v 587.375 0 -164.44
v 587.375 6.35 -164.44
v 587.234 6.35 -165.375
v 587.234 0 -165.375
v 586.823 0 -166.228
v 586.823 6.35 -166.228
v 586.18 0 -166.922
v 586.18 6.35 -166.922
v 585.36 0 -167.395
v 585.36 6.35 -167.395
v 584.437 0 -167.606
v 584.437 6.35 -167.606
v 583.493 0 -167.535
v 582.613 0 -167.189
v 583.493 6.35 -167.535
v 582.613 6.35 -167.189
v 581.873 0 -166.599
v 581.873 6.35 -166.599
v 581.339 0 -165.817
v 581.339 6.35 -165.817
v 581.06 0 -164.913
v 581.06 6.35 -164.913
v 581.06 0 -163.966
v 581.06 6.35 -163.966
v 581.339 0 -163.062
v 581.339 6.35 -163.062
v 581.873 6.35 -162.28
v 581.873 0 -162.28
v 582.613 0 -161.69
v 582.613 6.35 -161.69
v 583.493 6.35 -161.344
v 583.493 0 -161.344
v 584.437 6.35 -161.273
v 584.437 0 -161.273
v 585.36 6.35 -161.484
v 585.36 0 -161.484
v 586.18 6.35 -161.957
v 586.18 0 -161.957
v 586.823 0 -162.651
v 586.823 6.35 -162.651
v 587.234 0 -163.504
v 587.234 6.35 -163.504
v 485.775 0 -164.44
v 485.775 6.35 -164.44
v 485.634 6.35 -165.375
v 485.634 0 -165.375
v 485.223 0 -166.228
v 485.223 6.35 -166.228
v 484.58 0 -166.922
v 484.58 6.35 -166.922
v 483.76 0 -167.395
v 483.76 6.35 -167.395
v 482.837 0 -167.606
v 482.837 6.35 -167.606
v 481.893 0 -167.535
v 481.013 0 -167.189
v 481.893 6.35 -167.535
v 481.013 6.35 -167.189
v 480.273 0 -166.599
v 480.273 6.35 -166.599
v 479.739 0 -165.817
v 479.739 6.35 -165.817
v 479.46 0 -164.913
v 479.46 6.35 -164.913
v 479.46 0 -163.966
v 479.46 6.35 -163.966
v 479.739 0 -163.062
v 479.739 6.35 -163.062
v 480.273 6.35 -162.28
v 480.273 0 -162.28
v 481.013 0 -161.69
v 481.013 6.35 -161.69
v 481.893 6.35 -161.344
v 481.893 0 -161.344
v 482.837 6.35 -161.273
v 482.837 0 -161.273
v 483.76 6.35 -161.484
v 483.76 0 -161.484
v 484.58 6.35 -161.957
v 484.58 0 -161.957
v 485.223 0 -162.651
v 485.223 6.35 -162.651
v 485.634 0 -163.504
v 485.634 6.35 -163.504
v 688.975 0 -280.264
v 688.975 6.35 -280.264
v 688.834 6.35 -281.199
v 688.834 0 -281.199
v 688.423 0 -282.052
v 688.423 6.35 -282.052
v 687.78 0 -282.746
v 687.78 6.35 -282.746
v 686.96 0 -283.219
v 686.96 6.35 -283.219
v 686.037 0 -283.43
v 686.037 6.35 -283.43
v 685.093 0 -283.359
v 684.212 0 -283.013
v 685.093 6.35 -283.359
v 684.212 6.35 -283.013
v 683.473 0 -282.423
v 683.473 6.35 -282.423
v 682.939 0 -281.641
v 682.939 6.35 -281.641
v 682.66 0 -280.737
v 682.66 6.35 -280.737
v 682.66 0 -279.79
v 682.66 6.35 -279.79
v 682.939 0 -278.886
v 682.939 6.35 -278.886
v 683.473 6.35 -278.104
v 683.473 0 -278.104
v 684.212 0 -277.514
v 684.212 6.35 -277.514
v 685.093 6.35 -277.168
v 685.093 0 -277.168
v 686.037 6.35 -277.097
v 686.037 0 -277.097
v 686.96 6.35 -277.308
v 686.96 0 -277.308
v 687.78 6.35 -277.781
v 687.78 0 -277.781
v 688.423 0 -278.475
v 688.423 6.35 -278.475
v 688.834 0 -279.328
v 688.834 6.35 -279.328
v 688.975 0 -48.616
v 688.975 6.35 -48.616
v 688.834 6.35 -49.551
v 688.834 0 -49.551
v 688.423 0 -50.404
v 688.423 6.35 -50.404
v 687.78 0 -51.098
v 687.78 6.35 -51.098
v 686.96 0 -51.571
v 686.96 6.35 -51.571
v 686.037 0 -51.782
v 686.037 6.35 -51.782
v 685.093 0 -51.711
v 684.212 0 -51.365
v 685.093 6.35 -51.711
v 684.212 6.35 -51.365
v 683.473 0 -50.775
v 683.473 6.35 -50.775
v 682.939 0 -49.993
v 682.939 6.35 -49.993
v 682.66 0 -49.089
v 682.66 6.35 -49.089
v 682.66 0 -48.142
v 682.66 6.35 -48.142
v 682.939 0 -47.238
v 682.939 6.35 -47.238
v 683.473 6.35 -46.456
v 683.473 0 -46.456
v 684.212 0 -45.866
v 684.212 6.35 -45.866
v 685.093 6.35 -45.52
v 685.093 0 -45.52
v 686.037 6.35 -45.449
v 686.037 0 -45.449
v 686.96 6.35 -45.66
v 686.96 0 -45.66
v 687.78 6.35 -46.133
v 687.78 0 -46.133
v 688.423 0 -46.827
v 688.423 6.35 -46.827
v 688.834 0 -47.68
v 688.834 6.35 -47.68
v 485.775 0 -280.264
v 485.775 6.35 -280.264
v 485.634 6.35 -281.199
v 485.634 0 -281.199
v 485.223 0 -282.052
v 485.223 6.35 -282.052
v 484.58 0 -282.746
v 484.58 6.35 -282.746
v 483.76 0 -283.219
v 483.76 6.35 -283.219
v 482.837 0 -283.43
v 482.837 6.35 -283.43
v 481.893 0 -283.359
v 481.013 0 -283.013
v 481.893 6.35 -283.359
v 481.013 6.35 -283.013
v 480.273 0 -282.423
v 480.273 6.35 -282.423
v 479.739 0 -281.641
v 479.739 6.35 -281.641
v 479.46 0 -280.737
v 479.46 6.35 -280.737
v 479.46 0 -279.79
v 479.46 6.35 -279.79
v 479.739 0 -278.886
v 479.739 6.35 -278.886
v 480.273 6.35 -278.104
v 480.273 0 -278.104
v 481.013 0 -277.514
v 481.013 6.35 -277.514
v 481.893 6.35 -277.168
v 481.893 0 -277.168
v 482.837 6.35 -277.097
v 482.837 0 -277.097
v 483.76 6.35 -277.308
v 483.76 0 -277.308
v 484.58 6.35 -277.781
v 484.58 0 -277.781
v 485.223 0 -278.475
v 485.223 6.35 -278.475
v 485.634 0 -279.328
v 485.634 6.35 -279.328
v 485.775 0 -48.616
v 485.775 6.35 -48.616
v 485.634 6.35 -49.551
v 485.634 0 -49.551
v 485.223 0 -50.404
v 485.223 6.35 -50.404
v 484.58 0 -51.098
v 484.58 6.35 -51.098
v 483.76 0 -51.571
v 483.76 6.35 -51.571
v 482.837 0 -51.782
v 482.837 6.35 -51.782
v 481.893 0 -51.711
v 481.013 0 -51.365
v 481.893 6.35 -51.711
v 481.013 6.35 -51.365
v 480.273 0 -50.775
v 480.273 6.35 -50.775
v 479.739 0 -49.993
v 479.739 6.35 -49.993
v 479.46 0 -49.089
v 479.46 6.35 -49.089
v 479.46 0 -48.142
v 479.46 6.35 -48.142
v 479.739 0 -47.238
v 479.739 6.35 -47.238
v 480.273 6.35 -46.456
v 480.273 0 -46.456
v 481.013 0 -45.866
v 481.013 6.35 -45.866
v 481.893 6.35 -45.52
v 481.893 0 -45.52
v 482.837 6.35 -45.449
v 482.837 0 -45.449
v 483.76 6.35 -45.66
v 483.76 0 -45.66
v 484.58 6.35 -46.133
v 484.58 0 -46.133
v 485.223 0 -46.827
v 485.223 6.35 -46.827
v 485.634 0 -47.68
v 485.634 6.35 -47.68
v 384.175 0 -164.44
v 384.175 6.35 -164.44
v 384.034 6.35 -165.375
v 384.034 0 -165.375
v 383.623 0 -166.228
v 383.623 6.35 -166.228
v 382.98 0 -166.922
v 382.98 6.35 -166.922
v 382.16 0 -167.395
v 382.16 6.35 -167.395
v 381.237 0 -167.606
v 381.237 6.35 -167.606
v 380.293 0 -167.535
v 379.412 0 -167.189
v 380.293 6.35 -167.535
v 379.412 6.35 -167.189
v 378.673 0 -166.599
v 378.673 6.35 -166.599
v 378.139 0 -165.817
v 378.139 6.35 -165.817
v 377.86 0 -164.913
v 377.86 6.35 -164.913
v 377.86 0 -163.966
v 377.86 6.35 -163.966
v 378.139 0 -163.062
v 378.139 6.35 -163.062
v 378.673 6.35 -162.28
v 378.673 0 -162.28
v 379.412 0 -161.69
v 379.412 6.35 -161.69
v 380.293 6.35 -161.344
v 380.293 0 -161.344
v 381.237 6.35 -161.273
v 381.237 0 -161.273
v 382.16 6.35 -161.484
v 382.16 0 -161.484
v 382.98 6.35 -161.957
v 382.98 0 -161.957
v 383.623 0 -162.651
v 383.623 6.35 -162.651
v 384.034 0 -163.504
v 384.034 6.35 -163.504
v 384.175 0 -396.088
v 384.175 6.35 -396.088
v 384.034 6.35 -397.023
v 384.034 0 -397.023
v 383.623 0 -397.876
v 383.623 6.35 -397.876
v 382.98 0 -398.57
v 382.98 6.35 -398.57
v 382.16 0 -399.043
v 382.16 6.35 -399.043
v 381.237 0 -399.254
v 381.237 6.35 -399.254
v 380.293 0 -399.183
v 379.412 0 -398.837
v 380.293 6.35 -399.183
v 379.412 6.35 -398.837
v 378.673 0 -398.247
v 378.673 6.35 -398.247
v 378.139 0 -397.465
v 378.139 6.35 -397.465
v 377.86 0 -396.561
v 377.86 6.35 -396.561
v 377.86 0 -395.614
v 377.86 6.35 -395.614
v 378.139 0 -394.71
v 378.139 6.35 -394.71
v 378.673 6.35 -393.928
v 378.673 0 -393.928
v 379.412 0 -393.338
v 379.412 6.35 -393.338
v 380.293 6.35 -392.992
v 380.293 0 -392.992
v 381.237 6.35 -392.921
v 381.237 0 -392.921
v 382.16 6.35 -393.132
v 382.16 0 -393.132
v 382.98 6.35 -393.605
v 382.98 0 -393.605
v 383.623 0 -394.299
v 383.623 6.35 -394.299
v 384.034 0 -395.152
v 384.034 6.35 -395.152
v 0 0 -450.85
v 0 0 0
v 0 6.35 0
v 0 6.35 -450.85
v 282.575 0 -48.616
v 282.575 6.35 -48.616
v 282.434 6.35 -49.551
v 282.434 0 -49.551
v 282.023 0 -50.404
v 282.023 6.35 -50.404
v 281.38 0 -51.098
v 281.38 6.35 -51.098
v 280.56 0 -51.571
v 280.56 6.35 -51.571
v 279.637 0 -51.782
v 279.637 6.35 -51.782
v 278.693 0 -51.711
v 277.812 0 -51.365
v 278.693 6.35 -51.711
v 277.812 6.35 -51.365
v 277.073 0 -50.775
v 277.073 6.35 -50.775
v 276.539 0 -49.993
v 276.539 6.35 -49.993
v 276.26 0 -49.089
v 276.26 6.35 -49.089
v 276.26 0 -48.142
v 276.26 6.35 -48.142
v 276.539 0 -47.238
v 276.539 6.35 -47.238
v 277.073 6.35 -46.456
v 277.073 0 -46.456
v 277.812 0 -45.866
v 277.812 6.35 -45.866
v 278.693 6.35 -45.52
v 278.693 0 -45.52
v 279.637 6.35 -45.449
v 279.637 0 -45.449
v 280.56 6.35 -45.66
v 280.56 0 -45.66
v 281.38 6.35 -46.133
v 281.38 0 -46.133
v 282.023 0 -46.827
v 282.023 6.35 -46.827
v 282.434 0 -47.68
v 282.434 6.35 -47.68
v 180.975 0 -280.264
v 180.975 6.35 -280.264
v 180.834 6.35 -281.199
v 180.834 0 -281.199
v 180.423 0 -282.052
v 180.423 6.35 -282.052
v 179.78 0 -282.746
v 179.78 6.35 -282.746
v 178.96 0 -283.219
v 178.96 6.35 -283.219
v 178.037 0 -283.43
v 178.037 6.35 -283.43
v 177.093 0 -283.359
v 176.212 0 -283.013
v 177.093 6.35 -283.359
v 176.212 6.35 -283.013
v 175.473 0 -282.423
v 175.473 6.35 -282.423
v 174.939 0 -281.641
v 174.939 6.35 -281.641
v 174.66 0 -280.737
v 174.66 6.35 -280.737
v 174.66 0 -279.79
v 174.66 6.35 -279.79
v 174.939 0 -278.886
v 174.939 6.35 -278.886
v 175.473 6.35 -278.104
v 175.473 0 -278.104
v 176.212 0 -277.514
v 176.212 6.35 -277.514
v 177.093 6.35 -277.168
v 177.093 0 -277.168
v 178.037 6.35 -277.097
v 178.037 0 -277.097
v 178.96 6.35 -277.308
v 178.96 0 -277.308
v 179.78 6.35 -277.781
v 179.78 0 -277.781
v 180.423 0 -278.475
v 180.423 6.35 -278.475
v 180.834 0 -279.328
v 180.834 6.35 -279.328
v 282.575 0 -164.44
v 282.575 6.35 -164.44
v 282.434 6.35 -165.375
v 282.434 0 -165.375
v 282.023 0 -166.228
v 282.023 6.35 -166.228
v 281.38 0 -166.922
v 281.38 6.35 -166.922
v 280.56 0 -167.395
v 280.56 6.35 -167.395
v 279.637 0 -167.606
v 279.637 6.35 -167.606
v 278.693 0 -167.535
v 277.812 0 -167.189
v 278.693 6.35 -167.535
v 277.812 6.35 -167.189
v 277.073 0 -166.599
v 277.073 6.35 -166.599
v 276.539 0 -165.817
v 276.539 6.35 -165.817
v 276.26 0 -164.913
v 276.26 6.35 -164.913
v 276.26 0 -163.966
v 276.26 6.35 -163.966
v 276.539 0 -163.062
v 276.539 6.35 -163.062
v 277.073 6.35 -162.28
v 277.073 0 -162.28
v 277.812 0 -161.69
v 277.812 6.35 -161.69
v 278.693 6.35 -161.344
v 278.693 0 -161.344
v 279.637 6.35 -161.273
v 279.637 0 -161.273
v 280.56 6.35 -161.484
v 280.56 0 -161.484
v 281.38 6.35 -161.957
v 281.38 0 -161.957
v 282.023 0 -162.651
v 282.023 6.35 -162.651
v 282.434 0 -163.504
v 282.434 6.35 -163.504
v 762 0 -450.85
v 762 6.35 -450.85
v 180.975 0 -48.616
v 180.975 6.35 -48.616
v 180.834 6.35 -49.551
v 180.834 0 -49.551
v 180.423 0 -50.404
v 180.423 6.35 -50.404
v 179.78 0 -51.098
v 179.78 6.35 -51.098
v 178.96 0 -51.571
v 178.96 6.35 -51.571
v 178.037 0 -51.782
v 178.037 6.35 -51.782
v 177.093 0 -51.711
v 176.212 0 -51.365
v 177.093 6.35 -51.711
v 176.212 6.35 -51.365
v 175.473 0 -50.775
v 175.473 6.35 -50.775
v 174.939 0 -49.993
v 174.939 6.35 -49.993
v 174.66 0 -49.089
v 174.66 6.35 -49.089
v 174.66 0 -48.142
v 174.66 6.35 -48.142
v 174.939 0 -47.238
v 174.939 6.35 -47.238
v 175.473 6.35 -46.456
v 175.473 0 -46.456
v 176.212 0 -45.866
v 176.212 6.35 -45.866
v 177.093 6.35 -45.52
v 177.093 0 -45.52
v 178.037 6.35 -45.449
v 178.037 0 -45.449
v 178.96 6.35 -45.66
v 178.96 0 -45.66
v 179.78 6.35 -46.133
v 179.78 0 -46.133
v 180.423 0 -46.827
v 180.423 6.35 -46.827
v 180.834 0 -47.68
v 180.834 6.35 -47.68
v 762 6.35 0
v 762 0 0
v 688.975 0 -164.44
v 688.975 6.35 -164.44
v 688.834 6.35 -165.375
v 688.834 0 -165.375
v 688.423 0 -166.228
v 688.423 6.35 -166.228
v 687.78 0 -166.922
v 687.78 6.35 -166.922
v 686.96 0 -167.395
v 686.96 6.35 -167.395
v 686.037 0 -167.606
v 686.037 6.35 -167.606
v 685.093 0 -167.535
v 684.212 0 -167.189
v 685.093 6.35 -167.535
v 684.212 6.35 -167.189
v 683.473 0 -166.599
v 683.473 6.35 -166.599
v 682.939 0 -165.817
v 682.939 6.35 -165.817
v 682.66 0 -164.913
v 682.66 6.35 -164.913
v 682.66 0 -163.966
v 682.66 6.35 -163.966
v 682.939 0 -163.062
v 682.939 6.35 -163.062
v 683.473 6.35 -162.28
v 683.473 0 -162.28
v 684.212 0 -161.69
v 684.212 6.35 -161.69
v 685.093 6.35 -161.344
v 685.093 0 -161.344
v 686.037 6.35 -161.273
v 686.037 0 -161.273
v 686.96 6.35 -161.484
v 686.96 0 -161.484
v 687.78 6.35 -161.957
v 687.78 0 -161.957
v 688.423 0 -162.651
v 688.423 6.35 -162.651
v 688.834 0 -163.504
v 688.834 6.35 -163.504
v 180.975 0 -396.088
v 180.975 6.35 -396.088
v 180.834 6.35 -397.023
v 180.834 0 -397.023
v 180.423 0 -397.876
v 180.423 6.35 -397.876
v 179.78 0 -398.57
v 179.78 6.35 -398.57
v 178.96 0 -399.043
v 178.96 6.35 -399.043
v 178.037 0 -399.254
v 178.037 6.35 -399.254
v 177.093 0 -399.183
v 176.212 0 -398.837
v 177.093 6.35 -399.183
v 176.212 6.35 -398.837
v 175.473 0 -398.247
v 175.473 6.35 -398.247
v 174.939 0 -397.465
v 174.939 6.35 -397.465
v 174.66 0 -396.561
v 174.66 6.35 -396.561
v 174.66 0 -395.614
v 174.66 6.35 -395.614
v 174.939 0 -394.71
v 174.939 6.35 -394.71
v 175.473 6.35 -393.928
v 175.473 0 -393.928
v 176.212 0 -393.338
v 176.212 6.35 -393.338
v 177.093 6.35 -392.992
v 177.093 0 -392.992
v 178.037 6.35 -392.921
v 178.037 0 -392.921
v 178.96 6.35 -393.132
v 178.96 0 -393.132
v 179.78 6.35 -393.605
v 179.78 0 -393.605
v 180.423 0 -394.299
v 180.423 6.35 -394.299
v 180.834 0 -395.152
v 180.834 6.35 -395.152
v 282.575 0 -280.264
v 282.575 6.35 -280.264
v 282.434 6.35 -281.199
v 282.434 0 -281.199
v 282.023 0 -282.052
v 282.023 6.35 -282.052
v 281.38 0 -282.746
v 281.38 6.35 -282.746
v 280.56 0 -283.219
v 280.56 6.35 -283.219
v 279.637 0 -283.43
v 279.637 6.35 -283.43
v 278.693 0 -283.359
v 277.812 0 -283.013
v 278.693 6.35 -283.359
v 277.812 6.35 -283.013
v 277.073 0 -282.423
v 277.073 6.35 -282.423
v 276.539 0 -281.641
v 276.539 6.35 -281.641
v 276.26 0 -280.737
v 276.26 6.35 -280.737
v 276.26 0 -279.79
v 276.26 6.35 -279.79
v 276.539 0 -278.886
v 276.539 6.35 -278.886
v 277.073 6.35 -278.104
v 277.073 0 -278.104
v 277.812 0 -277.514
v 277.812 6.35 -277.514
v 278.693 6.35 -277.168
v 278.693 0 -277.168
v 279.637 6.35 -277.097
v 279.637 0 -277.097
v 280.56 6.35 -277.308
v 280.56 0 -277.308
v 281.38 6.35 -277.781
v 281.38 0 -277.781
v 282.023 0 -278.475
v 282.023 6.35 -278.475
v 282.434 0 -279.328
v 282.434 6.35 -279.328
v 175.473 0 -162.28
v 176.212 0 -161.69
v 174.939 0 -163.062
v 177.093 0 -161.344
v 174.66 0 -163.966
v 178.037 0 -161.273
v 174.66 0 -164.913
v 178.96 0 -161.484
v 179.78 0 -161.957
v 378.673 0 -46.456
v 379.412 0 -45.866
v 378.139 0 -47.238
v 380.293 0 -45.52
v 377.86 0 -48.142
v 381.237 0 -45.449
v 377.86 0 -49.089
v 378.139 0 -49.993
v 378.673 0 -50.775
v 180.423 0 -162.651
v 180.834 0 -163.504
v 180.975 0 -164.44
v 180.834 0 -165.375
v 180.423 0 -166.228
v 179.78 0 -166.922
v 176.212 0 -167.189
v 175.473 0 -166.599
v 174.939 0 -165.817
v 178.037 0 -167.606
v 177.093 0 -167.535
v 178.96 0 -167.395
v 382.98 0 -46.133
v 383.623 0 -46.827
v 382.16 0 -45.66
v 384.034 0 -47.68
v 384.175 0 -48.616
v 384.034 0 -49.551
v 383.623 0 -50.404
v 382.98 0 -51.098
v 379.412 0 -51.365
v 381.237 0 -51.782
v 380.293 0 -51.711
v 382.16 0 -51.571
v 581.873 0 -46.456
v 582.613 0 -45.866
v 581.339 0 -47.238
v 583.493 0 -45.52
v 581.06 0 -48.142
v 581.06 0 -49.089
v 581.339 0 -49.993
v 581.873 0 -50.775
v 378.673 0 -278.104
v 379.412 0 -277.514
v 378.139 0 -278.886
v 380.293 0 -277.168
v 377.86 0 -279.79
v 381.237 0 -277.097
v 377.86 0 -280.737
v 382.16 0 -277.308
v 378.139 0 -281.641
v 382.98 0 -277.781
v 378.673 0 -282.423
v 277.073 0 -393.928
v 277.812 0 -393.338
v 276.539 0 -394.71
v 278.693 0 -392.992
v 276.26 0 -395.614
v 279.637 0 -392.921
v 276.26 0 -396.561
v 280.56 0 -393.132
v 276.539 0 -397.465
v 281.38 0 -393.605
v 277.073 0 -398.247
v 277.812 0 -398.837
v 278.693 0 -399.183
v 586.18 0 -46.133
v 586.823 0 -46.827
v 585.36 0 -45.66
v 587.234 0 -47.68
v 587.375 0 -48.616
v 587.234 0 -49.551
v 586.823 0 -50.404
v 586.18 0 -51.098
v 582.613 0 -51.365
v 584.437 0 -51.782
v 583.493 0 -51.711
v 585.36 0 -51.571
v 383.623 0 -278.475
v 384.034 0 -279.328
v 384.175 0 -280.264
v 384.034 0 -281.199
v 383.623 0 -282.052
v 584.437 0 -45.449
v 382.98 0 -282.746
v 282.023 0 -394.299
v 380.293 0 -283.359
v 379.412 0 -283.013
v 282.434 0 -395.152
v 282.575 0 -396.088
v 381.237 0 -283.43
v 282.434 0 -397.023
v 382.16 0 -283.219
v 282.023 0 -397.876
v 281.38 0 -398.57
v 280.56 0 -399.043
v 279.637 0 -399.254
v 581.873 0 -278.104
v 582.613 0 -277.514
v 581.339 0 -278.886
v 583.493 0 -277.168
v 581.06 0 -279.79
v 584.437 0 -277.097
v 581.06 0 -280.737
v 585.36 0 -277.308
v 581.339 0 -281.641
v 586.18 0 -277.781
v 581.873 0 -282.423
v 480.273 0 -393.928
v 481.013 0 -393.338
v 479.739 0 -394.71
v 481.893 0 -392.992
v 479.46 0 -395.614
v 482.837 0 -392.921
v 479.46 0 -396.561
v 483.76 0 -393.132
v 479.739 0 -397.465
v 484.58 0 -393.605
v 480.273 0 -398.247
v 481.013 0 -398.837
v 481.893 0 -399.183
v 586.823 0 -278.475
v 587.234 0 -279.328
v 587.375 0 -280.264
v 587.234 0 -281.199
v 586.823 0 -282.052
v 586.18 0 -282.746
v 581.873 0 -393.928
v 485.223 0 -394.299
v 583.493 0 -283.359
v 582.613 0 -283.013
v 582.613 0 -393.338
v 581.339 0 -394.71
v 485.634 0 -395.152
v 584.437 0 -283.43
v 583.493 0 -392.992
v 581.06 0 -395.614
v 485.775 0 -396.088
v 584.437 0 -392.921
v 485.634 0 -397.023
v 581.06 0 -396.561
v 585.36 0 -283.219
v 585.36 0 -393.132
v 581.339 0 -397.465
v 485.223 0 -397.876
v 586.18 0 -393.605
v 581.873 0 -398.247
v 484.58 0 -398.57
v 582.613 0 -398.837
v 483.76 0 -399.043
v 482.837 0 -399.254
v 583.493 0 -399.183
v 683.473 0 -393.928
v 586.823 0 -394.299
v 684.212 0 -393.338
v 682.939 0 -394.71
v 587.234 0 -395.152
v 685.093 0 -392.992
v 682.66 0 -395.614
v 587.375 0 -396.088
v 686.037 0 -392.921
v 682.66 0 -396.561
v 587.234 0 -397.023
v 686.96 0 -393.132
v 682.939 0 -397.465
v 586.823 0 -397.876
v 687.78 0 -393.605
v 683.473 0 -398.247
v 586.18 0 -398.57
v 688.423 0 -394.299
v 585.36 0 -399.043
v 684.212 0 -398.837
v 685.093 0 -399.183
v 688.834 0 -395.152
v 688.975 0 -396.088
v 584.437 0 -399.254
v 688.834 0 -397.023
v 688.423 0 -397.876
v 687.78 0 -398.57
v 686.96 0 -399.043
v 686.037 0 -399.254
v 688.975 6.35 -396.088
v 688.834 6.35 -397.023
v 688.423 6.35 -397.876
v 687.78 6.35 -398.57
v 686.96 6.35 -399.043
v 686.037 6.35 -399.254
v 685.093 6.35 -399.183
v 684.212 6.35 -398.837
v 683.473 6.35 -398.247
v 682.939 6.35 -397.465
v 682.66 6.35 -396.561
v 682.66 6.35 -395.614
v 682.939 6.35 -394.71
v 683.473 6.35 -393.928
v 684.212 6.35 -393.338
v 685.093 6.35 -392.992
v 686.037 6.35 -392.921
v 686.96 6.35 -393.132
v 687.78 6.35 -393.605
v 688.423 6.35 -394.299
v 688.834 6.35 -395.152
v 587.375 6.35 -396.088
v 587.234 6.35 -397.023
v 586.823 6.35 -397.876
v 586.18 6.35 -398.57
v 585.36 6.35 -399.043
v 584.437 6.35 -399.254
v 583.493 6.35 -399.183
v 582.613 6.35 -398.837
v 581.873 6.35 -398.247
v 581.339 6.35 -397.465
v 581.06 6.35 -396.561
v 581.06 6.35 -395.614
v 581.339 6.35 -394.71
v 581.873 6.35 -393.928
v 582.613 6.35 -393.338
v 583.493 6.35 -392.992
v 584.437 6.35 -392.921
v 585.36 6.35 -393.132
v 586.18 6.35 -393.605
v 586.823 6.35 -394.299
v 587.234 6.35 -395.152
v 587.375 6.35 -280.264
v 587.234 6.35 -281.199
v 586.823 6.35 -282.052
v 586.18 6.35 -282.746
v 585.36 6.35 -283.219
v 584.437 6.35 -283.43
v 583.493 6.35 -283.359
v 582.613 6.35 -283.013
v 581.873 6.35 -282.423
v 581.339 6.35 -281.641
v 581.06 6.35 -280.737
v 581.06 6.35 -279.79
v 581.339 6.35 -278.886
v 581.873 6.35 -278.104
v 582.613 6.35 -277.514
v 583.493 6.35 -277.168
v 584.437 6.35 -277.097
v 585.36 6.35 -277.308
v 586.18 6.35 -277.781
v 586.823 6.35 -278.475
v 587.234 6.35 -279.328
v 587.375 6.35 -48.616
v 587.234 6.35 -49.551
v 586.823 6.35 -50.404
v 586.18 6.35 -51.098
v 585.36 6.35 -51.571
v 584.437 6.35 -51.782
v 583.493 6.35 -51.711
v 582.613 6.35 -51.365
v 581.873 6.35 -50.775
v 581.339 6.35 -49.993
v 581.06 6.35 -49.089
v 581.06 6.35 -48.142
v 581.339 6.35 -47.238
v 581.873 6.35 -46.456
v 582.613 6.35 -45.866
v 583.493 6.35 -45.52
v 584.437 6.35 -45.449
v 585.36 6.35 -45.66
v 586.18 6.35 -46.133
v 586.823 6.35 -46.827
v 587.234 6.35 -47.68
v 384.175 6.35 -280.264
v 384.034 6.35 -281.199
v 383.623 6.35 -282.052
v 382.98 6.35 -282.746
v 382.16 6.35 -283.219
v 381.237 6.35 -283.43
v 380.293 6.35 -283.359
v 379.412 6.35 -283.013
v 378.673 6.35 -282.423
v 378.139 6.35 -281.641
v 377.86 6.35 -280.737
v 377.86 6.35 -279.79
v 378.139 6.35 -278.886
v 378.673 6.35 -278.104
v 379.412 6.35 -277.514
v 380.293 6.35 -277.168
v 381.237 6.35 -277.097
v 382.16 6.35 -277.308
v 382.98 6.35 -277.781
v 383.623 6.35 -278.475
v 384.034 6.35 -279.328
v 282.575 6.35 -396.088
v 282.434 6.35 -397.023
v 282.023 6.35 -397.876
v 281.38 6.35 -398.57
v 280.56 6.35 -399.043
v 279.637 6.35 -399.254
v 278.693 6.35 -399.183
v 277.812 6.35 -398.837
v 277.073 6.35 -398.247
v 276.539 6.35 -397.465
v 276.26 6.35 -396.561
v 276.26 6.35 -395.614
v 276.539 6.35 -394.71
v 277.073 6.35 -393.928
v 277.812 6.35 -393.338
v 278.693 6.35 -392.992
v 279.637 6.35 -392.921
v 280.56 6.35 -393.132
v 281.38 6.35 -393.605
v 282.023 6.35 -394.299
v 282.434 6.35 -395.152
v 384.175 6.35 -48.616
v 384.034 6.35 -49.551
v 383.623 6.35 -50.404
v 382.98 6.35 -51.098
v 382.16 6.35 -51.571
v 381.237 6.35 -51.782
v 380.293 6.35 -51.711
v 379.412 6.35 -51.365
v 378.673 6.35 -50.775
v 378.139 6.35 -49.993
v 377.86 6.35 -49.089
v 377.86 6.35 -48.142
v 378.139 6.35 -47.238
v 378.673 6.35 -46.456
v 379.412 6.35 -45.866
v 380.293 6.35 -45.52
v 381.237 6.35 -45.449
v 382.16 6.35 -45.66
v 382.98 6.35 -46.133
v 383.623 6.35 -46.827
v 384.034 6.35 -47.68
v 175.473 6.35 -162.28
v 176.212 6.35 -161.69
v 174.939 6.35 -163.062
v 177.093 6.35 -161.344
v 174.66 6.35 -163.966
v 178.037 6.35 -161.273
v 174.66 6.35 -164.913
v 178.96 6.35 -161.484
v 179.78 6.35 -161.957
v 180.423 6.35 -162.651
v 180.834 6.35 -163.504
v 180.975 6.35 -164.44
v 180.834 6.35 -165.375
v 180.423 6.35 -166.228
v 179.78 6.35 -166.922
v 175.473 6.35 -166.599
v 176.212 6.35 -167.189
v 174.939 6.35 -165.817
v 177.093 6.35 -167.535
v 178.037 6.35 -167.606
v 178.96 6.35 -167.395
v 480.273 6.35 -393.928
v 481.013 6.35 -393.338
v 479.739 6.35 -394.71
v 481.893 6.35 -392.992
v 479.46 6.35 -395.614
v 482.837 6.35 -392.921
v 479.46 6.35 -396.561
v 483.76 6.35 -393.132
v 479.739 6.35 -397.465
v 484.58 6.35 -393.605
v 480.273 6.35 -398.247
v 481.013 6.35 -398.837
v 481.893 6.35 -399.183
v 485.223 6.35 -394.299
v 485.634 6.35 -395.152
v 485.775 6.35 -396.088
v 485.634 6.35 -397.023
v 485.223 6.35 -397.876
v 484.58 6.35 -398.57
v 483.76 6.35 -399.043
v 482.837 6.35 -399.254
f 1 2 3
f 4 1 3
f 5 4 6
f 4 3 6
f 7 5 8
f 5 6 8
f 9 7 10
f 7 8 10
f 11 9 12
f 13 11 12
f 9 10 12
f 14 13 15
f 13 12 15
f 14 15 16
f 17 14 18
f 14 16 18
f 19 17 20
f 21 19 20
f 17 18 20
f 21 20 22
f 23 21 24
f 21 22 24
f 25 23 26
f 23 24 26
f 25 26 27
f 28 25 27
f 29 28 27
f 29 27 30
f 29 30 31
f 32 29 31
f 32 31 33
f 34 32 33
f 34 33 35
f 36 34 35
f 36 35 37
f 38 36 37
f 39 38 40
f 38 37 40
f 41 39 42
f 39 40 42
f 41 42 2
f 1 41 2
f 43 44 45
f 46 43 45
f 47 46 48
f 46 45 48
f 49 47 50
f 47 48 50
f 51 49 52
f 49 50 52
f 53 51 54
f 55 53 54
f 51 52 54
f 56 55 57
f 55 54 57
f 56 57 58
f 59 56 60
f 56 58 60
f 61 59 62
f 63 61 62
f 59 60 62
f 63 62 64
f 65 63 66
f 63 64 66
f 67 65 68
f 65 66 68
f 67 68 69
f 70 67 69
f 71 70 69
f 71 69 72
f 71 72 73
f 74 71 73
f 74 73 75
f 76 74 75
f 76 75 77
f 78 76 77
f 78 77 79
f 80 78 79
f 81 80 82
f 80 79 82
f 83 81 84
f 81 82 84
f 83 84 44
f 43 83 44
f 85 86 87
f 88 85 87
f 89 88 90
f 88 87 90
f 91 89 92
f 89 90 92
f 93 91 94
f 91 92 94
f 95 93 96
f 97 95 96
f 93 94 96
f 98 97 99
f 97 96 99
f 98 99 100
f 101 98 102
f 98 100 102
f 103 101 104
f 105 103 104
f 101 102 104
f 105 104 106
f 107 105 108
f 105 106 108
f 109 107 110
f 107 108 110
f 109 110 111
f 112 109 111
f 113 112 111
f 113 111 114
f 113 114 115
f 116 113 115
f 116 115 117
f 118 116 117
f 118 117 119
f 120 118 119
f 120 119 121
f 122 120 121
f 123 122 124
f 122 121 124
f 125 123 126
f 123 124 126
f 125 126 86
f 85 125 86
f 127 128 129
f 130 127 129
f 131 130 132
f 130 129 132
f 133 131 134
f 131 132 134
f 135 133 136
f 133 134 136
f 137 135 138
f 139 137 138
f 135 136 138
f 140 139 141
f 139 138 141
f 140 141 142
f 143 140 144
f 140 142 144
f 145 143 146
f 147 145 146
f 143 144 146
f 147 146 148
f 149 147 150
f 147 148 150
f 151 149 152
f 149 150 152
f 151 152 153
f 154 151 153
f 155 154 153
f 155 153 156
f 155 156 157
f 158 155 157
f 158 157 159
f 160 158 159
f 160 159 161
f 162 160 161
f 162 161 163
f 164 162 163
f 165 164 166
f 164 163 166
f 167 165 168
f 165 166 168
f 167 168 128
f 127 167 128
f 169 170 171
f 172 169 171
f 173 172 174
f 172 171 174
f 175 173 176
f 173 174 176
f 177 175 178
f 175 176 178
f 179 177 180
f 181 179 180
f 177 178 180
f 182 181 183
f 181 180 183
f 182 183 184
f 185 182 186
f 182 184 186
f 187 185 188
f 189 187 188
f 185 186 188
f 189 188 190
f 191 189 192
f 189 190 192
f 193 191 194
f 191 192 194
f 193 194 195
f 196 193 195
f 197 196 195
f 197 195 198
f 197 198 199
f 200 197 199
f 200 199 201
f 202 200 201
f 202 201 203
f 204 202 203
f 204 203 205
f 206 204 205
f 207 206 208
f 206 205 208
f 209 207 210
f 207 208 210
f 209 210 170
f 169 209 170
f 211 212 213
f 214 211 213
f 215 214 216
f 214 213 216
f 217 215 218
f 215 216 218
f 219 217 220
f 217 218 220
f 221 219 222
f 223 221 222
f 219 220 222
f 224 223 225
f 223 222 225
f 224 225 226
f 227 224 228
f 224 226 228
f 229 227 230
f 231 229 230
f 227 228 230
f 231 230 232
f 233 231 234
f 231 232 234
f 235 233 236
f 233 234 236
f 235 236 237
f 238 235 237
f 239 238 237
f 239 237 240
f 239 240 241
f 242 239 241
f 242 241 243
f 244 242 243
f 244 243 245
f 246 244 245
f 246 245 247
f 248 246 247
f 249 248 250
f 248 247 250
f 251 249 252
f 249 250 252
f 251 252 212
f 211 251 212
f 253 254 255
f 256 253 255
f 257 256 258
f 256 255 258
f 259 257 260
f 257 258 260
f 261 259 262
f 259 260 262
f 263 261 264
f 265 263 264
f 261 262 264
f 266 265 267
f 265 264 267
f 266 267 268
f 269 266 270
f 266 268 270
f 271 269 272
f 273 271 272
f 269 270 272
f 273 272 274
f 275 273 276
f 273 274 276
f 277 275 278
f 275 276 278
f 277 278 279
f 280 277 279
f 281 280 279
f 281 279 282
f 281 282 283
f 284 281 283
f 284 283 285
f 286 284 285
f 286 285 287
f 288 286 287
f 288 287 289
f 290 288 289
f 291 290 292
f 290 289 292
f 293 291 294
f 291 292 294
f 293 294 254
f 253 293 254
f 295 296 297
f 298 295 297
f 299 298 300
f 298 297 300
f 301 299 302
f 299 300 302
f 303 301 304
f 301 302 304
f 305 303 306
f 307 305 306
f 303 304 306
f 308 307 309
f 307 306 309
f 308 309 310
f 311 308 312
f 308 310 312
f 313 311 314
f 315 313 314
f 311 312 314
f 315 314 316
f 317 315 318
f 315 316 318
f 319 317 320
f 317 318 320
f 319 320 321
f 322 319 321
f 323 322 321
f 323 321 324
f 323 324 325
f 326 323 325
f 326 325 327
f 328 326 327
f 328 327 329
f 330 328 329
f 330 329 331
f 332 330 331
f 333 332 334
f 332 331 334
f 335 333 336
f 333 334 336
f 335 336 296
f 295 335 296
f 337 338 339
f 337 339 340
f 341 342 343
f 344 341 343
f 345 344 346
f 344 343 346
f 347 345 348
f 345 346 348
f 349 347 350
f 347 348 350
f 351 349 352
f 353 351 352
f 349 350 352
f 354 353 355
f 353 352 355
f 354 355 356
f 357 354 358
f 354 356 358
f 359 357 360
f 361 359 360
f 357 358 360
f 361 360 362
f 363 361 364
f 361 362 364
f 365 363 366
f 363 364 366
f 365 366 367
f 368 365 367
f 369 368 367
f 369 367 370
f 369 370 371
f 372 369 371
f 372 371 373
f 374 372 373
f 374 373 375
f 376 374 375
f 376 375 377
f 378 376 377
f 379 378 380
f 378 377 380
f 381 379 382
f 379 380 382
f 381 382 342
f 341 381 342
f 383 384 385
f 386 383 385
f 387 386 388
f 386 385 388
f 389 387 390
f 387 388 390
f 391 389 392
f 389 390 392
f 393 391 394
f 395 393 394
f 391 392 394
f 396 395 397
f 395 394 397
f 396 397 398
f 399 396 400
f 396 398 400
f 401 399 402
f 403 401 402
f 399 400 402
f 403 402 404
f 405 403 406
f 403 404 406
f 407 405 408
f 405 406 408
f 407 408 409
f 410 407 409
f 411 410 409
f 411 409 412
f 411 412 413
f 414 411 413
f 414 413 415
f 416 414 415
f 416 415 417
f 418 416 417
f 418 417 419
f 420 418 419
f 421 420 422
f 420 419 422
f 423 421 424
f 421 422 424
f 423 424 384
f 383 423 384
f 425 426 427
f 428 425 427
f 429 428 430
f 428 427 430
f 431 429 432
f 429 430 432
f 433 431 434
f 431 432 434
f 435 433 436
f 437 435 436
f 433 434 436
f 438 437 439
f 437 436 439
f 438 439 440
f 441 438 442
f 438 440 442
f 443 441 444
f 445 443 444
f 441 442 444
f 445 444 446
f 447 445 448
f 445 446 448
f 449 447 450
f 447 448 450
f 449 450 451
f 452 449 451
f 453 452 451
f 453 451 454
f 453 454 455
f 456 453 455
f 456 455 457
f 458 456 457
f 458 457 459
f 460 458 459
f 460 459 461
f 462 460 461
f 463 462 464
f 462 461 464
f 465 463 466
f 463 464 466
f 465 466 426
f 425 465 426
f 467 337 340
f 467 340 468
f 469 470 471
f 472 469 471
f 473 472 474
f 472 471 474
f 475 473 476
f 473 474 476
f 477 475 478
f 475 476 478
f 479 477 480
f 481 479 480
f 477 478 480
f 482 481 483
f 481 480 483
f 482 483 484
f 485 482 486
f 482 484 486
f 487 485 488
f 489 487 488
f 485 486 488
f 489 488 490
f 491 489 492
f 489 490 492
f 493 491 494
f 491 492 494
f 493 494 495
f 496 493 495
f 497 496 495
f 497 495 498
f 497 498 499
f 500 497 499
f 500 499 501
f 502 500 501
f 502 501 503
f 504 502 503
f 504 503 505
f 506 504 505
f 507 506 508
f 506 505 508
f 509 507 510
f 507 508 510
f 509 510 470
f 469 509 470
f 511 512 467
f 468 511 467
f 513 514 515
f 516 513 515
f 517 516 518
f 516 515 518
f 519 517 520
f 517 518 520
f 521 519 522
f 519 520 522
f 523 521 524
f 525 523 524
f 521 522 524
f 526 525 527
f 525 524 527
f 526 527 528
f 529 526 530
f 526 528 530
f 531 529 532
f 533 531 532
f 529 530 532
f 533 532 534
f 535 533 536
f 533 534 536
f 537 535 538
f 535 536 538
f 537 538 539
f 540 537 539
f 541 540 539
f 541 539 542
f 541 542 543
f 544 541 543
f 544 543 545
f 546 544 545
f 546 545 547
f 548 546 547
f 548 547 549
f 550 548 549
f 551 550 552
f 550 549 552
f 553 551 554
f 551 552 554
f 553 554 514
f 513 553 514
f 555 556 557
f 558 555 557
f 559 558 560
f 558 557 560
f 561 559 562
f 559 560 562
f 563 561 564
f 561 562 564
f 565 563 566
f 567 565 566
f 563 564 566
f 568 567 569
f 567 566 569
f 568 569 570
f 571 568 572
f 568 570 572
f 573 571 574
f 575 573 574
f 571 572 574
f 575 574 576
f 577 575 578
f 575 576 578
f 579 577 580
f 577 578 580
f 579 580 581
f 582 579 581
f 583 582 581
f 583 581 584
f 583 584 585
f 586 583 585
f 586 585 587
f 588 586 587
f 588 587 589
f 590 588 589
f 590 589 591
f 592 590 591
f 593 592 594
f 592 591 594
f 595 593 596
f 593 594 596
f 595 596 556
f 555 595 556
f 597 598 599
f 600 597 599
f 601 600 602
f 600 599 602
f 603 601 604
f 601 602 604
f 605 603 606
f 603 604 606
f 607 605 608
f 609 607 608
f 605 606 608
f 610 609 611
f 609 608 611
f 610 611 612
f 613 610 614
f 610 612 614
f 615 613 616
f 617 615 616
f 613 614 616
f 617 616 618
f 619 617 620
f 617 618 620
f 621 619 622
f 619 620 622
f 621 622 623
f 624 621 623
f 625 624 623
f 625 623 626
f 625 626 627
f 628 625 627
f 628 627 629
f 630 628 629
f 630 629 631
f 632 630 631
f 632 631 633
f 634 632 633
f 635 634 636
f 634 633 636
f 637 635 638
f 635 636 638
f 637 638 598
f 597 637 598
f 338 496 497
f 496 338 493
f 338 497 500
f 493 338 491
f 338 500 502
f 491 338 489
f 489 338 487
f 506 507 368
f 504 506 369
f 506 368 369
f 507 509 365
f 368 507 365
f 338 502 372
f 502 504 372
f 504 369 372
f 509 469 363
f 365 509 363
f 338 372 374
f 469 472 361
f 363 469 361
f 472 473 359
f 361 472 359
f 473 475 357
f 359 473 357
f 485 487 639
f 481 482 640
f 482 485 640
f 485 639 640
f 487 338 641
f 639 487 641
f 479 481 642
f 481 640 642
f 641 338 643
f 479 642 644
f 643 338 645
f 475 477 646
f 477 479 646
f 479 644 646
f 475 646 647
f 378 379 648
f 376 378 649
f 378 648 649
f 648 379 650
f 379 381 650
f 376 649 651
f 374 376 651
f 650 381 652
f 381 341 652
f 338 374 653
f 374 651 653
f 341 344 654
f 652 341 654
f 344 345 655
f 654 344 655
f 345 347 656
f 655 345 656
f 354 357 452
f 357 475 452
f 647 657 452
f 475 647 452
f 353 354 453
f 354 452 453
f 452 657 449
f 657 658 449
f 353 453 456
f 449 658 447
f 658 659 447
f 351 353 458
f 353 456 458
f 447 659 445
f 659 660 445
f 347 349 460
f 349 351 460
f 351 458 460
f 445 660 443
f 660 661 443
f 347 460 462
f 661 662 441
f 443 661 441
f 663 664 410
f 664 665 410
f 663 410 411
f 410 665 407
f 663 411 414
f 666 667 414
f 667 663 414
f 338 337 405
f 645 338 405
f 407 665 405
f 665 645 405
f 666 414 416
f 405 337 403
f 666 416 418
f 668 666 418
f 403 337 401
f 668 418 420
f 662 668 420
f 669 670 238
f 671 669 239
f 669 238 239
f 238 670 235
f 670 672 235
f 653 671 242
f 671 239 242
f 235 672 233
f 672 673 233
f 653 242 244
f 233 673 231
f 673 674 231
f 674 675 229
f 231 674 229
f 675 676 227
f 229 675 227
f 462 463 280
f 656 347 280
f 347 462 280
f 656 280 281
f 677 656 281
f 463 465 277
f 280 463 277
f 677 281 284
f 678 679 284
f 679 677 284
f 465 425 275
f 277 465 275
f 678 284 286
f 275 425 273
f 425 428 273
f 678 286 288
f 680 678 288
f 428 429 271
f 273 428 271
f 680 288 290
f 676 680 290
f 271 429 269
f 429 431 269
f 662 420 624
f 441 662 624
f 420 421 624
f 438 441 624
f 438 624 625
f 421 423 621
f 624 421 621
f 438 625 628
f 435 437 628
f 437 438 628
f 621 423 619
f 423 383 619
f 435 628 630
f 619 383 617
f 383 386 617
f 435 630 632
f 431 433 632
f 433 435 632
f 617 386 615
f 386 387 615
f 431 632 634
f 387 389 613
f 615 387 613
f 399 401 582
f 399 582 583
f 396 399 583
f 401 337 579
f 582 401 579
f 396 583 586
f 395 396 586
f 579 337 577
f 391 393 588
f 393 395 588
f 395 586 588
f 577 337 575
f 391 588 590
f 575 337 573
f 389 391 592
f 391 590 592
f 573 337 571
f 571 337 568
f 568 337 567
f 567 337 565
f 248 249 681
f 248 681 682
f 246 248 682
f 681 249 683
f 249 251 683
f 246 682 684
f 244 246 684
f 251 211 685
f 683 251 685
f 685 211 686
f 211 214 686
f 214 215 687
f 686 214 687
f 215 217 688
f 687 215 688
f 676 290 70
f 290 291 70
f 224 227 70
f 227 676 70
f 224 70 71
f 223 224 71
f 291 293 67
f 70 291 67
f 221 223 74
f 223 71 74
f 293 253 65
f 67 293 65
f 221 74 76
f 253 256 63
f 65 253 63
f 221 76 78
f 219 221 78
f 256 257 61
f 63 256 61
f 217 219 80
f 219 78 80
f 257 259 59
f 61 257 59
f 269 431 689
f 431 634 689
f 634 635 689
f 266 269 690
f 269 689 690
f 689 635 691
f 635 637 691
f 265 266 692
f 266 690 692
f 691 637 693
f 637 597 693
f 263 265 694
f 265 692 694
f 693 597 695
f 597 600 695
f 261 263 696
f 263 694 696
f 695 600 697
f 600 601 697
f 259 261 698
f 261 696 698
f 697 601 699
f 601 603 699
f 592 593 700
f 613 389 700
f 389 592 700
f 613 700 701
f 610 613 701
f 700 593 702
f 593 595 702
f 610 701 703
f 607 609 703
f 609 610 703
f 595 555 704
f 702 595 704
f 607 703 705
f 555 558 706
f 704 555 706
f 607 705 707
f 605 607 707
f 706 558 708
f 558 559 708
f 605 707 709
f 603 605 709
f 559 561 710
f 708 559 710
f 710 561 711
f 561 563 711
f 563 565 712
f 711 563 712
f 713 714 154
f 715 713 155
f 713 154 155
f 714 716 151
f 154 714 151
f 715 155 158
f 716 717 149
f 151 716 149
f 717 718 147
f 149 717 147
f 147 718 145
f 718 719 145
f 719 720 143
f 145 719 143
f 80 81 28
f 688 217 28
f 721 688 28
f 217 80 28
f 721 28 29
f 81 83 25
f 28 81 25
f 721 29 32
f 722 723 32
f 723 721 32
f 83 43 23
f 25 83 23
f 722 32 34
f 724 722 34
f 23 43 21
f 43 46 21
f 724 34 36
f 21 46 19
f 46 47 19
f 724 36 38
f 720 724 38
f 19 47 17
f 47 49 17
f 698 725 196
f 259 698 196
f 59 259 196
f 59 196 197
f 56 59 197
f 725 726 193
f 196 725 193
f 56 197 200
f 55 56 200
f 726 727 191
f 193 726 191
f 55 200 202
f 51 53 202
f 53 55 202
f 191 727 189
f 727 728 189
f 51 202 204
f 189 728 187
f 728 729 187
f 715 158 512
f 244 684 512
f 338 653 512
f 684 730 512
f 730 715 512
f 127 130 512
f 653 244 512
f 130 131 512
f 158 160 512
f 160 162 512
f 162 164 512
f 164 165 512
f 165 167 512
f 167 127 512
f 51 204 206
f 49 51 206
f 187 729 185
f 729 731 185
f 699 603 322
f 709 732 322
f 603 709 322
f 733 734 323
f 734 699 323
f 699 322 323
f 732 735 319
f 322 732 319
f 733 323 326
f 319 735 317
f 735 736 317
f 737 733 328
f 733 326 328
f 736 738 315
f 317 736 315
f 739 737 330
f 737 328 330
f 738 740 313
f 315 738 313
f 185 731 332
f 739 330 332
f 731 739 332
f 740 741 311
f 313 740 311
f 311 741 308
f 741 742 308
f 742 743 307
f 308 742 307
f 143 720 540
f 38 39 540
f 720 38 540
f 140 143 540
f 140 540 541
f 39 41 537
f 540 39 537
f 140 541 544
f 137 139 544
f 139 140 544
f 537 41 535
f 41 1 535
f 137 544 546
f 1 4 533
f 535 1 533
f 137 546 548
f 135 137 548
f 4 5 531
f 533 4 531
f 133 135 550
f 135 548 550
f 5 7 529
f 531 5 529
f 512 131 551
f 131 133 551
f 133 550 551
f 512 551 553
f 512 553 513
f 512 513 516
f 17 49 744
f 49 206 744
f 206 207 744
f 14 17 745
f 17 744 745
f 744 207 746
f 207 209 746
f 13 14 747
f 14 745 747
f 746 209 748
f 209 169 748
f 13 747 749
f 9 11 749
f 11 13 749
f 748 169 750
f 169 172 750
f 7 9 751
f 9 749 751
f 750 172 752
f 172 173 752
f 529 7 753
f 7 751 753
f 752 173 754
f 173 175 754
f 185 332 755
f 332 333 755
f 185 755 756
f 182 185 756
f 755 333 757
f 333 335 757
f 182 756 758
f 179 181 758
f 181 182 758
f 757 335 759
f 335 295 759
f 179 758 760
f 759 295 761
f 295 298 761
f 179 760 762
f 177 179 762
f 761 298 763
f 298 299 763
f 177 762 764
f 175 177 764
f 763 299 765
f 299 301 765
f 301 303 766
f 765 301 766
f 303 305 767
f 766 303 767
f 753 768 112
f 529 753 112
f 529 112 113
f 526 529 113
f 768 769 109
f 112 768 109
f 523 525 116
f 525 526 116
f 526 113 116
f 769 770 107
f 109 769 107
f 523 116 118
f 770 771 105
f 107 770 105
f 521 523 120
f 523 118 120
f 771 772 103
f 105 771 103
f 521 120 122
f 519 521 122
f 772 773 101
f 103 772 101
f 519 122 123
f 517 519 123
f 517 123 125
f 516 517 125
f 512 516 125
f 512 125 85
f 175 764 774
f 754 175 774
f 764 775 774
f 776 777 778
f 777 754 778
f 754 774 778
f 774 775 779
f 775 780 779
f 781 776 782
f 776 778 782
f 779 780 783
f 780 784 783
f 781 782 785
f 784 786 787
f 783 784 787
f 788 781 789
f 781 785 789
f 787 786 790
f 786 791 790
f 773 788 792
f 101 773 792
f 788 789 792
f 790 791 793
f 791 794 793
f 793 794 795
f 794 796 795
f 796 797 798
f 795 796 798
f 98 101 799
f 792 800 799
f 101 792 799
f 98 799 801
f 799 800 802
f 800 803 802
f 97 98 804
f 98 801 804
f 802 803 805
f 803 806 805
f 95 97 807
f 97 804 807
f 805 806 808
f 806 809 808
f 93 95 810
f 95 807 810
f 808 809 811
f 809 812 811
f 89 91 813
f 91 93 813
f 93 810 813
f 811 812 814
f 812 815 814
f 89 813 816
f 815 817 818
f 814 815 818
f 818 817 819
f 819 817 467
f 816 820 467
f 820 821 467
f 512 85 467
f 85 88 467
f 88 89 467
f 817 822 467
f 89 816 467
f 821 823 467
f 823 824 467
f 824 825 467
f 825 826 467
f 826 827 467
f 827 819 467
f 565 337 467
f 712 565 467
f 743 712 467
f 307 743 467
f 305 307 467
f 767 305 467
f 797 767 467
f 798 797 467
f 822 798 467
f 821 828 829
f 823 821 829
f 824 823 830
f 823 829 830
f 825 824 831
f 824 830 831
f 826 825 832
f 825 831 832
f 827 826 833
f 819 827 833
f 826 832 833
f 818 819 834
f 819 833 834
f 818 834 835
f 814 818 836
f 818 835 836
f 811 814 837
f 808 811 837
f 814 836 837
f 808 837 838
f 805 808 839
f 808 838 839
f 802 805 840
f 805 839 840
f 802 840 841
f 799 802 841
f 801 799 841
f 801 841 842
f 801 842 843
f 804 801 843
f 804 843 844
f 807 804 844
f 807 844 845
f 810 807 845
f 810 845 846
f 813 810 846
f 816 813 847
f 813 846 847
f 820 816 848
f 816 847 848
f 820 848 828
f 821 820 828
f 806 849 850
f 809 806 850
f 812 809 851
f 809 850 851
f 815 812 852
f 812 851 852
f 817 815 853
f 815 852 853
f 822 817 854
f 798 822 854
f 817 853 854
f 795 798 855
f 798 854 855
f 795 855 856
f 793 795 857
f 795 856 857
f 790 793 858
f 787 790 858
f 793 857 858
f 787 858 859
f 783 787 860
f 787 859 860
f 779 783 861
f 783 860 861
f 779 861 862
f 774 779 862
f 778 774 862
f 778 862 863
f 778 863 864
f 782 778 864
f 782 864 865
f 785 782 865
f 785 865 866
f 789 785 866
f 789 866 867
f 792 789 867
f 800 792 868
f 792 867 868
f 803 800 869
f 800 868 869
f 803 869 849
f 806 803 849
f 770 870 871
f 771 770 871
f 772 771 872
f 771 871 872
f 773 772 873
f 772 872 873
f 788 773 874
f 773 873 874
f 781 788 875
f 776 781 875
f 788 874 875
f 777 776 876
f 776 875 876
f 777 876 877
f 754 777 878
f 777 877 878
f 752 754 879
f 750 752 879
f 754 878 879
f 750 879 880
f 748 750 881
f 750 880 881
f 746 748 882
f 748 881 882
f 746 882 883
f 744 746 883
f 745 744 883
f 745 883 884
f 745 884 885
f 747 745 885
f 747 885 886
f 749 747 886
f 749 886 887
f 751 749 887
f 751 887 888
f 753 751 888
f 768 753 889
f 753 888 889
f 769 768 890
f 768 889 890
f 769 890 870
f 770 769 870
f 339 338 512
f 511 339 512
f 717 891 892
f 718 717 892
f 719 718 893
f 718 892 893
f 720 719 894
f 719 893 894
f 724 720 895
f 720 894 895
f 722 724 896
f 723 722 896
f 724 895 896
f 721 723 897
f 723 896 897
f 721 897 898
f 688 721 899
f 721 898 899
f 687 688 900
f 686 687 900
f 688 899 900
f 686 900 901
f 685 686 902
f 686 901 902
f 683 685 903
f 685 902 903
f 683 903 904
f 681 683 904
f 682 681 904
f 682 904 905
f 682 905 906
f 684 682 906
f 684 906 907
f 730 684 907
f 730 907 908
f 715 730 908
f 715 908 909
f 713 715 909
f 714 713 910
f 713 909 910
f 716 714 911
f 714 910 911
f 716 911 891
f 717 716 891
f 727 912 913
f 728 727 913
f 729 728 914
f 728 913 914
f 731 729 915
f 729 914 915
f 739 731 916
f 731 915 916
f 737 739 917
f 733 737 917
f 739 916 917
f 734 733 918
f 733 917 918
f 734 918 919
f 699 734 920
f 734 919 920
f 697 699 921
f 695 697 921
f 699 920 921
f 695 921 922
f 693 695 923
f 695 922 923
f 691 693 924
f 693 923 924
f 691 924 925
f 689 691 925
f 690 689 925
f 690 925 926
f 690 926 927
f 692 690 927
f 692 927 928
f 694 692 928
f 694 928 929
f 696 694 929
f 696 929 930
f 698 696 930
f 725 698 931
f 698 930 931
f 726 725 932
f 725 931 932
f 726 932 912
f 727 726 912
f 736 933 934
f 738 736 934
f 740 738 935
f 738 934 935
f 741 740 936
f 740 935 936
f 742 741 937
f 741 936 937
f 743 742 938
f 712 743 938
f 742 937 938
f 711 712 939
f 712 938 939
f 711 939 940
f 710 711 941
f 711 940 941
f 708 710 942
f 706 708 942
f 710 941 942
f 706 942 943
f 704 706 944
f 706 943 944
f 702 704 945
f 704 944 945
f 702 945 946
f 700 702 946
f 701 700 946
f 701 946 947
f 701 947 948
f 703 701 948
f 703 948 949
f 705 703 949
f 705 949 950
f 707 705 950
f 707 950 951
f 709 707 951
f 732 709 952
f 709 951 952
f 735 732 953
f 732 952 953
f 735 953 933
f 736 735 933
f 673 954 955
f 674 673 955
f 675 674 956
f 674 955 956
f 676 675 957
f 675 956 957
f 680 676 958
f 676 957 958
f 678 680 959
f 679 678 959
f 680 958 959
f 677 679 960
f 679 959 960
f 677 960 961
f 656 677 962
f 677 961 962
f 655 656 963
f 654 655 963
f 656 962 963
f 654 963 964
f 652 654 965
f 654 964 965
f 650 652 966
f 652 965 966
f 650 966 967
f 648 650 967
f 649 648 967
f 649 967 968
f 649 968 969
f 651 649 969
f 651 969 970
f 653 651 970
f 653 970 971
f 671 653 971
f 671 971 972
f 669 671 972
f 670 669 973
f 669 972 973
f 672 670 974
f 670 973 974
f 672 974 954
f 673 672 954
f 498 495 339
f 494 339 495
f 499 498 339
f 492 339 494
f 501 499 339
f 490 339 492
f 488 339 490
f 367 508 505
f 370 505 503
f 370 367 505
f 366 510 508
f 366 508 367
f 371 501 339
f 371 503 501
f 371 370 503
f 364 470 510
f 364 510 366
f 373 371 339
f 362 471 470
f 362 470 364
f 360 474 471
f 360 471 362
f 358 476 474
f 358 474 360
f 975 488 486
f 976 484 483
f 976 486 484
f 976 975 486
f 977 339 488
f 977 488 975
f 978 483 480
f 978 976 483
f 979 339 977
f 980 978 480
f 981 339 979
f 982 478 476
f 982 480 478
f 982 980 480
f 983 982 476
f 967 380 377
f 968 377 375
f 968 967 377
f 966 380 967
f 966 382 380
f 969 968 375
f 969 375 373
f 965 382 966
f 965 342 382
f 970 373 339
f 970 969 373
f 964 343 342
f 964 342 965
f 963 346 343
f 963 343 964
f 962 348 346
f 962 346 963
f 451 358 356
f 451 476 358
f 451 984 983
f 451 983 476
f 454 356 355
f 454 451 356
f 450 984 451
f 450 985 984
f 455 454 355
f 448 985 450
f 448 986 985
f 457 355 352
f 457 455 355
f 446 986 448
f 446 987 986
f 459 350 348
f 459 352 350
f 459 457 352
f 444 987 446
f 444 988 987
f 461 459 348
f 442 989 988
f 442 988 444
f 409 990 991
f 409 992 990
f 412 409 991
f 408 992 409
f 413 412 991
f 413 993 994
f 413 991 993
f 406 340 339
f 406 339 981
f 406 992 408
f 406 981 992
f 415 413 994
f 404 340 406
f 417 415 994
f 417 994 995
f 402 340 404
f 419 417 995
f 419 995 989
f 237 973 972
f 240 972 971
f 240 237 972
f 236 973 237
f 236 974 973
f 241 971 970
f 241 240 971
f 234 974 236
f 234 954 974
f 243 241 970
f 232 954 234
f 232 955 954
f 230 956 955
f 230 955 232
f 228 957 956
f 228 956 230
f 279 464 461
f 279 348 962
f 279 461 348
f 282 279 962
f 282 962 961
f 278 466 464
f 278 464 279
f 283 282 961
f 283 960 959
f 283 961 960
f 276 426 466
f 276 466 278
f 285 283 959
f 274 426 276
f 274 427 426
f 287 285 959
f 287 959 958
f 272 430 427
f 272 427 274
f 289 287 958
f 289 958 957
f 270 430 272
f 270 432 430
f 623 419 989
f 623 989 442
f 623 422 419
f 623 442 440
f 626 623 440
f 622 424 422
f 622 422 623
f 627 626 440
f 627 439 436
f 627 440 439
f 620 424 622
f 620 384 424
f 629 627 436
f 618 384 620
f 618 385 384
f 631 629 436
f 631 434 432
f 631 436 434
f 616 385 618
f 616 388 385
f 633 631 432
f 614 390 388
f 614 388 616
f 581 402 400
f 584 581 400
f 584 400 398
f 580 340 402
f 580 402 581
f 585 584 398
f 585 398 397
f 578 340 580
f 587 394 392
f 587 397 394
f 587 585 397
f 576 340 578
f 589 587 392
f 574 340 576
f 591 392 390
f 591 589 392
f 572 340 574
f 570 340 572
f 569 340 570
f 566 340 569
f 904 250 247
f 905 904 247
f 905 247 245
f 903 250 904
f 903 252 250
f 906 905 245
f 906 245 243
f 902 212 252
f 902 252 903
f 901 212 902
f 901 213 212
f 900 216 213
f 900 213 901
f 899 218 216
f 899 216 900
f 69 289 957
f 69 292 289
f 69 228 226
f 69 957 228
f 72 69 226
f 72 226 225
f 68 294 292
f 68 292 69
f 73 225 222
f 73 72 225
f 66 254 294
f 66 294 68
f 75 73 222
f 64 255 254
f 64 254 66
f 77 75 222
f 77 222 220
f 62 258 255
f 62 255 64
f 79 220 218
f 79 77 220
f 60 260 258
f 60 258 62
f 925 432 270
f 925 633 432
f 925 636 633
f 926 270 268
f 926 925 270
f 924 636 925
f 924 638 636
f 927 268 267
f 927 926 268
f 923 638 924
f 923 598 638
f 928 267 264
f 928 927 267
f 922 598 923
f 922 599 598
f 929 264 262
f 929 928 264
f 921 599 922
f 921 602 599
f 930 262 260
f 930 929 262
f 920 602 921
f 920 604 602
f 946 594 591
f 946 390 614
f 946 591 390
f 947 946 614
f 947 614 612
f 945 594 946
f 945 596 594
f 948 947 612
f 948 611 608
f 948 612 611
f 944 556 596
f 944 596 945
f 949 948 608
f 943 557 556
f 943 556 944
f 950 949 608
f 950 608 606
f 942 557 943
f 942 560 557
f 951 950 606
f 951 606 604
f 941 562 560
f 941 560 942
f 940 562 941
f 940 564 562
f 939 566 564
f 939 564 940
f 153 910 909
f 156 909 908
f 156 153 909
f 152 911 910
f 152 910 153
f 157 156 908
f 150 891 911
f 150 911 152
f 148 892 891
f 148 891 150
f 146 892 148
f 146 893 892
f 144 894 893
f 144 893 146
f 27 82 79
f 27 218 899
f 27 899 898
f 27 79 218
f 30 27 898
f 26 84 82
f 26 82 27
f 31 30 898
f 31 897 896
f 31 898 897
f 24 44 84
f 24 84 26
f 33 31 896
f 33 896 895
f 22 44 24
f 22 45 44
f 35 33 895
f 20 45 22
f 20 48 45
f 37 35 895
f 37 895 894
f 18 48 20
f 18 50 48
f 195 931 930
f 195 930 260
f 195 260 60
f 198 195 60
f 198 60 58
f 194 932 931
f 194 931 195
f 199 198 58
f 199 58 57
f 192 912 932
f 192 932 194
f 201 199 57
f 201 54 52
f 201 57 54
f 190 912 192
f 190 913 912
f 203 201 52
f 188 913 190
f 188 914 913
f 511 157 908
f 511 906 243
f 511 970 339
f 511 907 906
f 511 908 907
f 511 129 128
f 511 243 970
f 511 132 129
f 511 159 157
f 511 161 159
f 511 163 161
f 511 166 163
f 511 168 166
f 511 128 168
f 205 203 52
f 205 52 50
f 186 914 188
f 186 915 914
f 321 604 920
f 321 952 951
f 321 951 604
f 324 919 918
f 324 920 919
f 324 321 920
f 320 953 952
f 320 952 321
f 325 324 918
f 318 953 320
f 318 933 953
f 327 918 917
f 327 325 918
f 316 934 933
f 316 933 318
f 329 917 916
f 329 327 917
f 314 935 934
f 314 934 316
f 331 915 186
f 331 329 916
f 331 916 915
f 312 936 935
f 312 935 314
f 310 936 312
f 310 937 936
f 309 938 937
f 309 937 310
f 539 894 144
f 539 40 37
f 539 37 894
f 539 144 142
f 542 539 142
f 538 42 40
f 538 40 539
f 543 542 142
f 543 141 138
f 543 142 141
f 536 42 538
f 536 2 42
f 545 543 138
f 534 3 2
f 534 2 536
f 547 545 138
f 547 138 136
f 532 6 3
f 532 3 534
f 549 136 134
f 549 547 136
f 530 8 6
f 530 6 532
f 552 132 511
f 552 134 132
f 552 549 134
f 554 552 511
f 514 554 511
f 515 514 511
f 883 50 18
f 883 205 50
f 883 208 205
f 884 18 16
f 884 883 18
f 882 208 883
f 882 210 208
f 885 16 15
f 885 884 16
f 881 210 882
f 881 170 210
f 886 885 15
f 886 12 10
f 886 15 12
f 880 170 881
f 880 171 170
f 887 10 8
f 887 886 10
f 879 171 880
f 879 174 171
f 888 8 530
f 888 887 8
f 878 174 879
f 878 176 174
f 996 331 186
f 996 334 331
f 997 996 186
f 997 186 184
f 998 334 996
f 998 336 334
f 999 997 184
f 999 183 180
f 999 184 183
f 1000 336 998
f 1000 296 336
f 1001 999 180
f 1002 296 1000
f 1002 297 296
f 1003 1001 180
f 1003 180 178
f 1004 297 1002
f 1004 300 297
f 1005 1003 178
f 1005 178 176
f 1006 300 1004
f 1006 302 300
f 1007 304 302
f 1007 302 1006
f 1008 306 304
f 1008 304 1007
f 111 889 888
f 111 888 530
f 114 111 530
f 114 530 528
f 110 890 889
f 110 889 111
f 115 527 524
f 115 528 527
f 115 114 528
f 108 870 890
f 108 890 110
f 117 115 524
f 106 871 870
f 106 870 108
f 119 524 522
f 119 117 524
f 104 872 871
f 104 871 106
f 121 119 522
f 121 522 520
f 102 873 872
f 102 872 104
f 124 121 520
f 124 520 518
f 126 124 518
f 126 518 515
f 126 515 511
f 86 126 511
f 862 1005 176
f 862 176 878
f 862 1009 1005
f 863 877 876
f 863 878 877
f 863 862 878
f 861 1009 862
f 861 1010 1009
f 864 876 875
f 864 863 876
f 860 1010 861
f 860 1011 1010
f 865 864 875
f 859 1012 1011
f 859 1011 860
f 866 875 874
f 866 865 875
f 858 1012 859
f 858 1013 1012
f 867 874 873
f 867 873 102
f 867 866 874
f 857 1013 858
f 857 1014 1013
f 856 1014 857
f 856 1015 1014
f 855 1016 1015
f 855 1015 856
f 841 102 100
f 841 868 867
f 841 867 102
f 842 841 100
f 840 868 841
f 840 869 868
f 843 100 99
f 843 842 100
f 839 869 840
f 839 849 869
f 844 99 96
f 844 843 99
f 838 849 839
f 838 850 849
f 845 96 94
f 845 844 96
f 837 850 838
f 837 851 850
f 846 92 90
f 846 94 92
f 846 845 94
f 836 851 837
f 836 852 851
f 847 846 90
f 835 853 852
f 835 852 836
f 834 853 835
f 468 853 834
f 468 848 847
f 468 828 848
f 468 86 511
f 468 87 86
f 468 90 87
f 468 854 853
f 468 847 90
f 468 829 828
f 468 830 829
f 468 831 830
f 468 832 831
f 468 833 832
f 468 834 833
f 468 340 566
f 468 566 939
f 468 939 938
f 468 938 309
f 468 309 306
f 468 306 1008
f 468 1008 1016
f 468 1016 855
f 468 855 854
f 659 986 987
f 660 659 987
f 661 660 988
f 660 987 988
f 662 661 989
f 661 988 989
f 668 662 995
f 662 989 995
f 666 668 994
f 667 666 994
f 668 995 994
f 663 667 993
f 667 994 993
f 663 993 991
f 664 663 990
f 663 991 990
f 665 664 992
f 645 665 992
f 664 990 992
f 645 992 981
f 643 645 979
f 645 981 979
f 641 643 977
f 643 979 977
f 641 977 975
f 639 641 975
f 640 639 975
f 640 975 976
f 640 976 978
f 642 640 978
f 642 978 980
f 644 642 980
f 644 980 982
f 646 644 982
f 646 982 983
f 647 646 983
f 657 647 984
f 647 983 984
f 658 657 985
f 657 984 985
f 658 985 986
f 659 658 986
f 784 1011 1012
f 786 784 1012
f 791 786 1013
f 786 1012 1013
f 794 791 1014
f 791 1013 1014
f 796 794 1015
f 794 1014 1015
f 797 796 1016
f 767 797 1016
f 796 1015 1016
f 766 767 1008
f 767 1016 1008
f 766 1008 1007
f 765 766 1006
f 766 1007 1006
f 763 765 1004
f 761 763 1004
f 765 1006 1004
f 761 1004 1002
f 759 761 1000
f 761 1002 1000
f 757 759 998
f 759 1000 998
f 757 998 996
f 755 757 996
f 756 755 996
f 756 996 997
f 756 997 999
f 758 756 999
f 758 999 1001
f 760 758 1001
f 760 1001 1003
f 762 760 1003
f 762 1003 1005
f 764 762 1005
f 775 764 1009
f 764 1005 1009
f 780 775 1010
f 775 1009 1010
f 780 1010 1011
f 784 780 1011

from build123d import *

# Parameters (mm, degrees)
SKETCH1_W           = 762
SKETCH1_H           = 450.85
BOSS_EXTRUDE1_DEPTH = 6.35
SKETCH2_R           = 3.175
CUT_EXTRUDE1_DEPTH  = 6.35


with BuildPart() as part:
    # Sketch1 → Boss-Extrude1 (new body)
    with BuildSketch(Plane(origin=(0, 0, 0), x_dir=(1, 0, 0), z_dir=(0, 1, 0))):
        with Locations((381, 225.425)):
            Rectangle(SKETCH1_W, SKETCH1_H)
    extrude(amount=BOSS_EXTRUDE1_DEPTH)

    # Sketch2 → Cut-Extrude1 (cut)
    with BuildSketch(Plane(origin=(0, 6.35, 0), x_dir=(1, 0, 0), z_dir=(0, 1, 0))):
        with Locations((177.8, 396.0876)):
            Circle(SKETCH2_R)
        with Locations((279.4, 396.0876)):
            Circle(SKETCH2_R)
        with Locations((381, 396.0876)):
            Circle(SKETCH2_R)
        with Locations((482.6, 396.0876)):
            Circle(SKETCH2_R)
        with Locations((177.8, 280.2636)):
            Circle(SKETCH2_R)
        with Locations((279.4, 280.2636)):
            Circle(SKETCH2_R)
        with Locations((381, 280.2636)):
            Circle(SKETCH2_R)
        with Locations((482.6, 280.2636)):
            Circle(SKETCH2_R)
        with Locations((177.8, 164.4396)):
            Circle(SKETCH2_R)
        with Locations((279.4, 164.4396)):
            Circle(SKETCH2_R)
        with Locations((381, 164.4396)):
            Circle(SKETCH2_R)
        with Locations((482.6, 164.4396)):
            Circle(SKETCH2_R)
        with Locations((177.8, 48.6156)):
            Circle(SKETCH2_R)
        with Locations((279.4, 48.6156)):
            Circle(SKETCH2_R)
        with Locations((381, 48.6156)):
            Circle(SKETCH2_R)
        with Locations((482.6, 48.6156)):
            Circle(SKETCH2_R)
        with Locations((584.2, 396.0876)):
            Circle(SKETCH2_R)
        with Locations((685.8, 396.0876)):
            Circle(SKETCH2_R)
        with Locations((584.2, 280.2636)):
            Circle(SKETCH2_R)
        with Locations((685.8, 280.2636)):
            Circle(SKETCH2_R)
        with Locations((584.2, 164.4396)):
            Circle(SKETCH2_R)
        with Locations((685.8, 164.4396)):
            Circle(SKETCH2_R)
        with Locations((584.2, 48.6156)):
            Circle(SKETCH2_R)
        with Locations((685.8, 48.6156)):
            Circle(SKETCH2_R)
    extrude(amount=-CUT_EXTRUDE1_DEPTH, mode=Mode.SUBTRACT)


solid = part.part
